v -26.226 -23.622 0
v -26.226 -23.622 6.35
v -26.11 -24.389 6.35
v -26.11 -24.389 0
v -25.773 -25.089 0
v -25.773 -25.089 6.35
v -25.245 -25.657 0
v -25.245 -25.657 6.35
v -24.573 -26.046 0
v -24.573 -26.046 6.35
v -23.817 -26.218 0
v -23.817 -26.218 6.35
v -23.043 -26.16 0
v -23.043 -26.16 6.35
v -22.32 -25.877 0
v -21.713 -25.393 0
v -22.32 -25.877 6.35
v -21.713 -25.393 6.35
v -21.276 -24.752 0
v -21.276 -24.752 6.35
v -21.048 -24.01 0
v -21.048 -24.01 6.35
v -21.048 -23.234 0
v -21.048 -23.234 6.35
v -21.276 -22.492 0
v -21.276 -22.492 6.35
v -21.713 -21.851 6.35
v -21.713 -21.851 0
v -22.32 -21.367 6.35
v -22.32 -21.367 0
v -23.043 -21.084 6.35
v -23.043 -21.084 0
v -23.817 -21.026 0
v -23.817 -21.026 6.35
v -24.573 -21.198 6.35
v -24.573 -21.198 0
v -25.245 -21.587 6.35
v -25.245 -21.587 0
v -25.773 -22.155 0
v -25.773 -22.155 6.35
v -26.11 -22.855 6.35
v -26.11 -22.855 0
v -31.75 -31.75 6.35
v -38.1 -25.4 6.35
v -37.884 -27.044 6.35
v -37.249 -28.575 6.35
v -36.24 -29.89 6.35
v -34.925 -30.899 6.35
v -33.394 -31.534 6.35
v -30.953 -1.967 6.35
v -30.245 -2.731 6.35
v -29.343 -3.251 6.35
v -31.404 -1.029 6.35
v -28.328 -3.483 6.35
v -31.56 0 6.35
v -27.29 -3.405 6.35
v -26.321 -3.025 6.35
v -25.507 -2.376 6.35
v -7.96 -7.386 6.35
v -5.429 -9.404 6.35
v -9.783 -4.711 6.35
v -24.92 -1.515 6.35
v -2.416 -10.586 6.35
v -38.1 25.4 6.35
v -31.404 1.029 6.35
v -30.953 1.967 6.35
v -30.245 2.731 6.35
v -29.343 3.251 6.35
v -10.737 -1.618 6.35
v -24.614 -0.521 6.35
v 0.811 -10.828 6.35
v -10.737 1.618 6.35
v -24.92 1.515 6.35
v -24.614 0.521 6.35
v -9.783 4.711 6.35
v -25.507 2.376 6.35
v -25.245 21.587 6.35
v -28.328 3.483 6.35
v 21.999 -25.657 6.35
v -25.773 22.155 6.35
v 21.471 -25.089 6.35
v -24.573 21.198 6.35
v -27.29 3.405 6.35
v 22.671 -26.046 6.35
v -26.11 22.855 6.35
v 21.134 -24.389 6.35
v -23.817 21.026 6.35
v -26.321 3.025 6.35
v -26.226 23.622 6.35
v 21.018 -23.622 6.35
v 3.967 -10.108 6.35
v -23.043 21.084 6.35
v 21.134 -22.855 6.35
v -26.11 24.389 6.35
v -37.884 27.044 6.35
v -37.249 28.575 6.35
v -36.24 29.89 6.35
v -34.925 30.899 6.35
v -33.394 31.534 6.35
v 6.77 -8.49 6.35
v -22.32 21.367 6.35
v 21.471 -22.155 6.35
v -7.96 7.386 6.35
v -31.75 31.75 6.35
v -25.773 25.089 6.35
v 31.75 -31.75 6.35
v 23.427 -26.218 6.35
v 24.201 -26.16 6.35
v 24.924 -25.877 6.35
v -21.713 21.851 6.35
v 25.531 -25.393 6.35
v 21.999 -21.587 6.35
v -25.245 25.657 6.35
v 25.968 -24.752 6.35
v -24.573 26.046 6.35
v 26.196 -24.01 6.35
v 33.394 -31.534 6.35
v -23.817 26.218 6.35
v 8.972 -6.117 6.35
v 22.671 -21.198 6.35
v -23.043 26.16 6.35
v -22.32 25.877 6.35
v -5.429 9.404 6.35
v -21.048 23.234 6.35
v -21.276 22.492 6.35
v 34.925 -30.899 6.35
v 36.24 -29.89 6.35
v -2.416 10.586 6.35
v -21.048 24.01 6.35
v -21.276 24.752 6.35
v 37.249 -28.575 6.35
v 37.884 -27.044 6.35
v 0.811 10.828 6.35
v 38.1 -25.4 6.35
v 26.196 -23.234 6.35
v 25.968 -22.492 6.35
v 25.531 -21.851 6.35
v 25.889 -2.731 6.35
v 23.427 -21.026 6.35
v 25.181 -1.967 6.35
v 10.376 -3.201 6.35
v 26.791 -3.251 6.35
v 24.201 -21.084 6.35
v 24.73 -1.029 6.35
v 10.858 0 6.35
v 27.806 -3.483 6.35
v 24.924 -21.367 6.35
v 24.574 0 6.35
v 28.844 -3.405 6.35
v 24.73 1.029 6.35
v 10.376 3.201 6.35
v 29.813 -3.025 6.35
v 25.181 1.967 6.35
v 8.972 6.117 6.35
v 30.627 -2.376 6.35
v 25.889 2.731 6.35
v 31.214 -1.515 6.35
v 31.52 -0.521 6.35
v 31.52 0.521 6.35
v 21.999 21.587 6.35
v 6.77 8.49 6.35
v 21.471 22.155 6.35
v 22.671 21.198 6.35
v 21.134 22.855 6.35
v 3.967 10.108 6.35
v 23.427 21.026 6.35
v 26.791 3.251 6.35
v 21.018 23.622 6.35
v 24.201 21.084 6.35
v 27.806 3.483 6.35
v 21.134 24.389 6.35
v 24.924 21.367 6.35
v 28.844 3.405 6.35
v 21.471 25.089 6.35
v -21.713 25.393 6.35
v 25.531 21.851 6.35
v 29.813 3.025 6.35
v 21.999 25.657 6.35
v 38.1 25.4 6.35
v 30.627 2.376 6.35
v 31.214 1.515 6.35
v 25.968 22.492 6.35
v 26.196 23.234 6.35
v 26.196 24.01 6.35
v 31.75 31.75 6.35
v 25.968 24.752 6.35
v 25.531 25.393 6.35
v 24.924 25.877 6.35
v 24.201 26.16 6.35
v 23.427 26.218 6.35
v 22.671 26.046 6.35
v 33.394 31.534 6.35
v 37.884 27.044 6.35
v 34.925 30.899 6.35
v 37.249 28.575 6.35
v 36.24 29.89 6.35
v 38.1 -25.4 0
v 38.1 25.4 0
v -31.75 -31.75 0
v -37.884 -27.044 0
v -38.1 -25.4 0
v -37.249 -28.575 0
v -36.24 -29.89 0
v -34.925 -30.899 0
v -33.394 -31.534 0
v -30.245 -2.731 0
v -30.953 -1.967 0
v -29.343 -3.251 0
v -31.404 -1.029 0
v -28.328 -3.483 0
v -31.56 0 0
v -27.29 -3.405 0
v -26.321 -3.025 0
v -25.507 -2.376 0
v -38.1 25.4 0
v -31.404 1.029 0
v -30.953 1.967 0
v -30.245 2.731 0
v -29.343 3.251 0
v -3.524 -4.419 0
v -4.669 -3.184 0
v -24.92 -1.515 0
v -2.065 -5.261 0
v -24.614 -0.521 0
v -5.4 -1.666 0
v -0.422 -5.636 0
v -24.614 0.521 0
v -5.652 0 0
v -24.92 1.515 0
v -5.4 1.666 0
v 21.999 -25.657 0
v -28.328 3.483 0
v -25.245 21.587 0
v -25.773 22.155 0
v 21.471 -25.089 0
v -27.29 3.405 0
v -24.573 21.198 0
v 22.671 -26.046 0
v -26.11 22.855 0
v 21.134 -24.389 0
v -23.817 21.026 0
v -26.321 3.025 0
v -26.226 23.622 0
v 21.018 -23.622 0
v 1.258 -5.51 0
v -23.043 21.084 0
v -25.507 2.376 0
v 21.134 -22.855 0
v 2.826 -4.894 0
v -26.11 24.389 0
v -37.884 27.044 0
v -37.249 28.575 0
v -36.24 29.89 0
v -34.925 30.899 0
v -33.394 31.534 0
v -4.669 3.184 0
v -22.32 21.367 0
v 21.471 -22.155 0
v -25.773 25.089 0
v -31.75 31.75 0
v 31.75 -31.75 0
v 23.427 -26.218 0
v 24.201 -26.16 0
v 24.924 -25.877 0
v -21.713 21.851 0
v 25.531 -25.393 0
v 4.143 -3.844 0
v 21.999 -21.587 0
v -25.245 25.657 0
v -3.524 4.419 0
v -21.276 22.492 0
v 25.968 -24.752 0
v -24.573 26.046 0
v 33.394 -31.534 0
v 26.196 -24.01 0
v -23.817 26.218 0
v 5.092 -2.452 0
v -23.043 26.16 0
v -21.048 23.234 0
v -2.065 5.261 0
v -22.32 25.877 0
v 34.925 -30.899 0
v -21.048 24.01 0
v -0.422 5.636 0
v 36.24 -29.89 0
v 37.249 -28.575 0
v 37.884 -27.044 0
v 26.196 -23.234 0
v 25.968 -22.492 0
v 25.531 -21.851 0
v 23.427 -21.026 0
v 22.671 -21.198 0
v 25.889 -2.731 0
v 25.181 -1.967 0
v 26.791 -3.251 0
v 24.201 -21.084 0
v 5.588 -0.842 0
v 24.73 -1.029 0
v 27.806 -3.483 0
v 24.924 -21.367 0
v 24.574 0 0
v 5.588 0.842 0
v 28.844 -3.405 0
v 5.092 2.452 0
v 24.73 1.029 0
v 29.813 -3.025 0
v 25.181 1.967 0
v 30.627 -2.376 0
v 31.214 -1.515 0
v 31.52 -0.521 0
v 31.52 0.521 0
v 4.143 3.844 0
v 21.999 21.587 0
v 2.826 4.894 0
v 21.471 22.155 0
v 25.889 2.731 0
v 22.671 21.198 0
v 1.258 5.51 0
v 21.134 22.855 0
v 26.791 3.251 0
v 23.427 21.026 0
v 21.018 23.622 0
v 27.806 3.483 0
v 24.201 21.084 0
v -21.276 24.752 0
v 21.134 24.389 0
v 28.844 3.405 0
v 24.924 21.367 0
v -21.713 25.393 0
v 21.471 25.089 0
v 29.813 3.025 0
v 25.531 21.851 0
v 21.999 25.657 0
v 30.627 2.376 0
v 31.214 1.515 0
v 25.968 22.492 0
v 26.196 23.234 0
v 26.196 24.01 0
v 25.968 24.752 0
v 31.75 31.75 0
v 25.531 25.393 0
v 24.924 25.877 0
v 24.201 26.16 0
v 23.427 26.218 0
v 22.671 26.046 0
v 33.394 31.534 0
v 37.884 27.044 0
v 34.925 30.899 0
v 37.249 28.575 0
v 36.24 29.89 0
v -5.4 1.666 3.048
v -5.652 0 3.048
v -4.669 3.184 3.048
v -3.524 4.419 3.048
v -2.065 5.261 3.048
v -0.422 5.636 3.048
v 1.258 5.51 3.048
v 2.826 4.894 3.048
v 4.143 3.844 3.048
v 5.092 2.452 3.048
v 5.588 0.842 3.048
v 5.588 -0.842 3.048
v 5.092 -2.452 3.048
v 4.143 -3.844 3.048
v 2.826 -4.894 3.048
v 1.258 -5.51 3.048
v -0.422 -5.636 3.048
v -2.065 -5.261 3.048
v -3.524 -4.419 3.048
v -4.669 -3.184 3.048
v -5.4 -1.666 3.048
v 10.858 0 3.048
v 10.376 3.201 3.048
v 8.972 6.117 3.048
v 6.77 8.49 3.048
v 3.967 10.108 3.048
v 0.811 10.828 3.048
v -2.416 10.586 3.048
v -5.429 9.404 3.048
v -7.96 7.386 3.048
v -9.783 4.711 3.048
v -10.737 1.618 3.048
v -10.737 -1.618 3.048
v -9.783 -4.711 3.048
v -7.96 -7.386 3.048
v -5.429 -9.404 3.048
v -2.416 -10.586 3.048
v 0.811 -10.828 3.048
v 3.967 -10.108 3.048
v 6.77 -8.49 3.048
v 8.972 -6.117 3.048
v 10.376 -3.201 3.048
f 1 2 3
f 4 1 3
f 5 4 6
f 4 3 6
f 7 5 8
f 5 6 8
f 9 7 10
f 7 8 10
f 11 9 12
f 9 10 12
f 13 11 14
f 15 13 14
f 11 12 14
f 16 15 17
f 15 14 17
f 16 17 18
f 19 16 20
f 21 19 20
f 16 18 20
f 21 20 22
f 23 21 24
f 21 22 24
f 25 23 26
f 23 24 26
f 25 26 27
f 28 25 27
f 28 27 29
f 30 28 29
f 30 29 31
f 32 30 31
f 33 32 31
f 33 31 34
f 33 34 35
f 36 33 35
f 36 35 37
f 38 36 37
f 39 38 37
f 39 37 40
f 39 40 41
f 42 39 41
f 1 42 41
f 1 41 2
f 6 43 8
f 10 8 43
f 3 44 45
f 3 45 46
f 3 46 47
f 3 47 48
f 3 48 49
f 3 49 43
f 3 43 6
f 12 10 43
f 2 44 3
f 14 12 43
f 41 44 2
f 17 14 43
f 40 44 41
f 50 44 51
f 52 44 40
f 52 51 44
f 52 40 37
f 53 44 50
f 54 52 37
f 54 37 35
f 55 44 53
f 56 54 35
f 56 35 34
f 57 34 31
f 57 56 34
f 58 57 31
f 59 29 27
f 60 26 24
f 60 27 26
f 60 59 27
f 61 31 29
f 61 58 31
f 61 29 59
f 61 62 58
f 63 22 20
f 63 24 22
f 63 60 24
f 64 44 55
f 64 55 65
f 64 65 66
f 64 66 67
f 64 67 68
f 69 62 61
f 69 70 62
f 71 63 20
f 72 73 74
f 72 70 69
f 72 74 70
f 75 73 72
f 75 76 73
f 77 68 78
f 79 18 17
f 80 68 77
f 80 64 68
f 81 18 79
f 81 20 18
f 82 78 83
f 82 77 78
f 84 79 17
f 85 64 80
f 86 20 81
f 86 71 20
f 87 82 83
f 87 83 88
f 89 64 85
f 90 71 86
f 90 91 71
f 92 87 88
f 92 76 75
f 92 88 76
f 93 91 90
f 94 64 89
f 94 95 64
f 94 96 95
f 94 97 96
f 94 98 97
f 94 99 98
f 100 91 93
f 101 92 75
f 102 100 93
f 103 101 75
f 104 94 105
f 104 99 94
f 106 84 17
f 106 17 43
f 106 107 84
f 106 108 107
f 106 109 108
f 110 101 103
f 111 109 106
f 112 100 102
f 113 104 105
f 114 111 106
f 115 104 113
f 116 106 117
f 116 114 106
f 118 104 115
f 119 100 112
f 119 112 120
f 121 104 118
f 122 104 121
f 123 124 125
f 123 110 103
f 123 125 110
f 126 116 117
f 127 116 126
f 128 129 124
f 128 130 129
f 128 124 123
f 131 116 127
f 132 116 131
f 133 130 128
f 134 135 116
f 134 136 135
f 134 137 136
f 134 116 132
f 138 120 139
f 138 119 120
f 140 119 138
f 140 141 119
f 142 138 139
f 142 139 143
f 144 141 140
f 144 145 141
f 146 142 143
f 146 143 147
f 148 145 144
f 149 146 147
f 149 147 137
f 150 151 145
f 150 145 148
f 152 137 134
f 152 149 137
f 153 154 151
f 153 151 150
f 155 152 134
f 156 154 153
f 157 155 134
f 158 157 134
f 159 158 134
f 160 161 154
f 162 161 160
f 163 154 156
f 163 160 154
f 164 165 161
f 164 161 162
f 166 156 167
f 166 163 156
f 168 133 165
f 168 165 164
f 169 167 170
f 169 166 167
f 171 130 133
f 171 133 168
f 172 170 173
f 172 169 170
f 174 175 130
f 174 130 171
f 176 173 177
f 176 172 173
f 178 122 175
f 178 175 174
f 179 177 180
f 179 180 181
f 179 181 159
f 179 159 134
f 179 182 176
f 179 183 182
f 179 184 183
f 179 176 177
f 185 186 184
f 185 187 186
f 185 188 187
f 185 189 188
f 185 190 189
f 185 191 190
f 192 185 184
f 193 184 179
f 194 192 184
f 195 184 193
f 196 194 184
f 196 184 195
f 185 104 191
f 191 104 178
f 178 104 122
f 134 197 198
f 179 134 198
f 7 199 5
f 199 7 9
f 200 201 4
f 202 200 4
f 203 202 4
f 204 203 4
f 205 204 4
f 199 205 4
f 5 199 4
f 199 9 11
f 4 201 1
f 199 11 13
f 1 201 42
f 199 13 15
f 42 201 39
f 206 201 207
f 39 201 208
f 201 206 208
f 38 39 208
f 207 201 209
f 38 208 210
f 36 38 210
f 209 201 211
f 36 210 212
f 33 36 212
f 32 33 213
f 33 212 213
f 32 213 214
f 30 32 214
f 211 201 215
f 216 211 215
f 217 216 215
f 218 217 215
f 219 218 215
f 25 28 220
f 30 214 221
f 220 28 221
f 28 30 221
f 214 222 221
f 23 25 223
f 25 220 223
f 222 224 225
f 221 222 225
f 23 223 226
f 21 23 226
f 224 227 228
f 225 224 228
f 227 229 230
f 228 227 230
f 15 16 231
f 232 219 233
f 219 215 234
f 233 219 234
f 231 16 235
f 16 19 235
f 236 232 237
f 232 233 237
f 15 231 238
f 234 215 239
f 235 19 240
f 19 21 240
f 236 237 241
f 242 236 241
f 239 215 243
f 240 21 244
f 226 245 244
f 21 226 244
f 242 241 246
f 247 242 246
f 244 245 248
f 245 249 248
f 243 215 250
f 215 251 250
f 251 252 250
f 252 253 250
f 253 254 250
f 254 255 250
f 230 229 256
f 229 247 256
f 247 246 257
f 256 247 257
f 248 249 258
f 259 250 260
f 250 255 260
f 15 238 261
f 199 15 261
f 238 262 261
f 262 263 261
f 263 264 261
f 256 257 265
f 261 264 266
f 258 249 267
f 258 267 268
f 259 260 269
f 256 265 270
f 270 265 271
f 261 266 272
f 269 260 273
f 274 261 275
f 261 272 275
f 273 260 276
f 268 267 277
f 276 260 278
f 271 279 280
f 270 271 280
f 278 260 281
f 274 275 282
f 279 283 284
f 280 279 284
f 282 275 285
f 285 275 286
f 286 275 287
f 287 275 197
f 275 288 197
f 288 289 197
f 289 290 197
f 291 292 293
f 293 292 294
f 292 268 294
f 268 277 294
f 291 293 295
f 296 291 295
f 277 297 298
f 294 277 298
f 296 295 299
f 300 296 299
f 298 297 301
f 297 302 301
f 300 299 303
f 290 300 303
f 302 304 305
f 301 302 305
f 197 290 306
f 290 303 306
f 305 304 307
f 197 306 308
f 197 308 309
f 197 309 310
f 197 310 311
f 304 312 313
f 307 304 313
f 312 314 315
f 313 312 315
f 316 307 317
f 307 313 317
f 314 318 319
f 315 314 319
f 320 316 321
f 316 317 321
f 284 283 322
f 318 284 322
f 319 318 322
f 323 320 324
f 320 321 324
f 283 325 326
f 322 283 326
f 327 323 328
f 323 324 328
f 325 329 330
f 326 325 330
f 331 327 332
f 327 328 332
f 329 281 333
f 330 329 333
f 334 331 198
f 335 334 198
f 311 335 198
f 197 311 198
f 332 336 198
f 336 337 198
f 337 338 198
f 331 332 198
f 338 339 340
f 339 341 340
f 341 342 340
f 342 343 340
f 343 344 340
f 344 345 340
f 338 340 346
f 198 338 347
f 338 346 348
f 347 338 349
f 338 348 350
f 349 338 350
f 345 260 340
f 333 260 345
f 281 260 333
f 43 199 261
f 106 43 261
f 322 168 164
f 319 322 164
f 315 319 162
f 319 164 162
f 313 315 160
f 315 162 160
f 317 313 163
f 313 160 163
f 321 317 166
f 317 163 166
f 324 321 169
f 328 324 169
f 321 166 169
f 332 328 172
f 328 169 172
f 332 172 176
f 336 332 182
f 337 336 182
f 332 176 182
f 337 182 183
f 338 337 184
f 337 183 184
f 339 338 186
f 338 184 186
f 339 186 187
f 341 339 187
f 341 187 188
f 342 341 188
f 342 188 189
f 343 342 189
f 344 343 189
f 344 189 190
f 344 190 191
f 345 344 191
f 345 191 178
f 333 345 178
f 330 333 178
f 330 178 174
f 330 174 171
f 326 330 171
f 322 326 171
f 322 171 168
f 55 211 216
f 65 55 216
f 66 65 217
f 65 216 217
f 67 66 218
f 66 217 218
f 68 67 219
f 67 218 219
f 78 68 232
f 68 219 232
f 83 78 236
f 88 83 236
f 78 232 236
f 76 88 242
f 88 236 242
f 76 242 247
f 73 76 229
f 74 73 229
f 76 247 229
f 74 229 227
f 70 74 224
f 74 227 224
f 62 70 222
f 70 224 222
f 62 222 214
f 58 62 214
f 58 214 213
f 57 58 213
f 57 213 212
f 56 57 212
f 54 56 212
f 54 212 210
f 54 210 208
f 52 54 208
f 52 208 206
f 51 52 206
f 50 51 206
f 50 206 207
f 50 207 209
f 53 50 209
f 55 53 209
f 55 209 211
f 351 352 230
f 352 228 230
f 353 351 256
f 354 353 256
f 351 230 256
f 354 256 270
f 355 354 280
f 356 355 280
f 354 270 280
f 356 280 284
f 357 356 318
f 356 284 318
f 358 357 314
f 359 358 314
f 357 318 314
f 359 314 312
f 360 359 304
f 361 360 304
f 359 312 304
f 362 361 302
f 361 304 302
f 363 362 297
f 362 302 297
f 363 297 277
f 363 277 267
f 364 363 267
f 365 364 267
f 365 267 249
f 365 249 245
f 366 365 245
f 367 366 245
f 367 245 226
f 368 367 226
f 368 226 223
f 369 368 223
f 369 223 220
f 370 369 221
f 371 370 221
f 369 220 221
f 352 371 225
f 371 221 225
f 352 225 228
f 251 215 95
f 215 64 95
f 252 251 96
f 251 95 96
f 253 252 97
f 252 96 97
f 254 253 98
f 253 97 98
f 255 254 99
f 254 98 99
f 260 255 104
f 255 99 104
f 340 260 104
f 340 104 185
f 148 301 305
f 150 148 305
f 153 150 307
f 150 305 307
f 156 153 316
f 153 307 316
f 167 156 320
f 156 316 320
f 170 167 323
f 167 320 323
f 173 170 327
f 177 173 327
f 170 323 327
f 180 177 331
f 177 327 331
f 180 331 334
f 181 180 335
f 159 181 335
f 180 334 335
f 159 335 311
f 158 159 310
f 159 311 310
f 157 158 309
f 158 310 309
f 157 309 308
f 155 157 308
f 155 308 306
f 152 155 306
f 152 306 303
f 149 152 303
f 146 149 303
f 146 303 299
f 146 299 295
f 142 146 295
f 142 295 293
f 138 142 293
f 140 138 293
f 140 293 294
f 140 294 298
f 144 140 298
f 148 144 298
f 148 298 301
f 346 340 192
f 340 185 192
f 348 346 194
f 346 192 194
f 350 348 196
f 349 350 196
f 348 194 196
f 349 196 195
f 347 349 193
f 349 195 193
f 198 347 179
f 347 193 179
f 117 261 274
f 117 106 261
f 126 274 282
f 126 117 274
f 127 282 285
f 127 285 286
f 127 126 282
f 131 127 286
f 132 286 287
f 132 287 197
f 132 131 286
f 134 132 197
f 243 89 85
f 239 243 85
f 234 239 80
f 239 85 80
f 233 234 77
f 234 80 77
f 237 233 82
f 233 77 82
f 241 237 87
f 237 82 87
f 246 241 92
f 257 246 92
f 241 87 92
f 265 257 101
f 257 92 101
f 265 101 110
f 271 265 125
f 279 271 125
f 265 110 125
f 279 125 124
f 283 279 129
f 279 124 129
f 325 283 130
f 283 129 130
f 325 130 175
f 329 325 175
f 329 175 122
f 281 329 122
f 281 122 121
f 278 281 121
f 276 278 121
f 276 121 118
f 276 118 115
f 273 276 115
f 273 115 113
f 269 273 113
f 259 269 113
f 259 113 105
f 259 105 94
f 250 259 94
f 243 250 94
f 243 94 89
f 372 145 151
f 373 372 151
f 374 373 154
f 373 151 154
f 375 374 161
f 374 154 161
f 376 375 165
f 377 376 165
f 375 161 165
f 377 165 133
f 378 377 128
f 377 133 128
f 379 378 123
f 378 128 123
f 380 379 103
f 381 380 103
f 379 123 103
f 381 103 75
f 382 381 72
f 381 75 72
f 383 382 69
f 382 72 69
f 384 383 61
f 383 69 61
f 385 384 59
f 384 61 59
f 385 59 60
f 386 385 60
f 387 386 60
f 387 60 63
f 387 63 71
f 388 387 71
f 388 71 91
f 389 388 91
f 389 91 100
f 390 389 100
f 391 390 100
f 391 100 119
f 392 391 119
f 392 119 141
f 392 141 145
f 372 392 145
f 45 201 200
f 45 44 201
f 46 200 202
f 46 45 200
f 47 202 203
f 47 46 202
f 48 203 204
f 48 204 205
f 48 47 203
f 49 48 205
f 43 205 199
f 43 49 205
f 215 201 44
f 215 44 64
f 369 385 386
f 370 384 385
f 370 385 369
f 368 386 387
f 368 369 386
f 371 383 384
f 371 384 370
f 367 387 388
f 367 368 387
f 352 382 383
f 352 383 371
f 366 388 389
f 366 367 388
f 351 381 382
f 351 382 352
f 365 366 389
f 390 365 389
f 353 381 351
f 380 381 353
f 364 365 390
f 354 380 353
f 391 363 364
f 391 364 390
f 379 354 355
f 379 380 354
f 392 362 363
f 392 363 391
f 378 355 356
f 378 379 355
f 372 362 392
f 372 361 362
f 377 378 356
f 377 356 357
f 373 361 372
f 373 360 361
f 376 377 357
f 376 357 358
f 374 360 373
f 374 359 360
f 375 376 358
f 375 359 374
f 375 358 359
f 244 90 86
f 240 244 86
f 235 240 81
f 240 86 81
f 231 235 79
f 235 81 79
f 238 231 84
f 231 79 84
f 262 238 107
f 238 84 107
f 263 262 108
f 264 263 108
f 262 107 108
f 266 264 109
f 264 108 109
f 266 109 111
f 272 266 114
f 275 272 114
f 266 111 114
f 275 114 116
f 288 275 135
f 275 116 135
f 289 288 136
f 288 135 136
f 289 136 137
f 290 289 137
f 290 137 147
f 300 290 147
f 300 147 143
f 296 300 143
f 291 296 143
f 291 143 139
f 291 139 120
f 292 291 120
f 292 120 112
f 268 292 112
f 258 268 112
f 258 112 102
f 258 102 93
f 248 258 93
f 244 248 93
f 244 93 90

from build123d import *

# Parameters (mm, degrees)
F1_W           = 76.2
F1_H           = 63.5
F2_DEPTH       = 6.35
F4_D           = 11.303
F4_CBORE_D     = 21.717
F4_CBORE_DEPTH = 3.302
F6_D           = 6.985
F7_D           = 6.985
F8_D           = 5.207
F9_D           = 5.207
F10_D          = 5.207
F11_R          = 6.35


with BuildPart() as f2:
    # F1 (on Top) → F2 (new body)
    with BuildSketch(Plane.XY):
        Rectangle(F1_W, F1_H)
    extrude(amount=F2_DEPTH)

    # F4 (through all)
    with Locations(Plane.XY.offset(6.35)):
        with Locations((0, 0)):
            CounterBoreHole(F4_D / 2, F4_CBORE_D / 2, F4_CBORE_DEPTH)

    # F6 (through all)
    with Locations(Plane.XY.offset(6.35)):
        with Locations((-28.067, 0)):
            Hole(F6_D / 2)

    # F7 (through all)
    with Locations(Plane.XY.offset(6.35)):
        with Locations((28.067, 0)):
            Hole(F7_D / 2)

    # F8 (through all)
    with Locations(Plane(origin=(0, 0, 0), x_dir=(1, 0, 0), z_dir=(0, 0, -1))):
        with Locations((-23.622, 23.622)):
            Hole(F8_D / 2)

    # F9 (through all)
    with Locations(Plane(origin=(0, 0, 0), x_dir=(1, 0, 0), z_dir=(0, 0, -1))):
        with Locations((23.622, 23.622), (-23.622, -23.622)):
            Hole(F9_D / 2)

    # F10 (through all)
    with Locations(Plane(origin=(0, 0, 0), x_dir=(1, 0, 0), z_dir=(0, 0, -1))):
        with Locations((23.622, -23.622)):
            Hole(F10_D / 2)

    # F11
    f11_edges = [f2.edges().sort_by_distance(p)[0] for p in [
        (-38.1, -31.75, 3.175),
        (38.1, -31.75, 3.175),
        (38.1, 31.75, 3.175),
        (-38.1, 31.75, 3.175),
    ]]
    fillet(f11_edges, radius=F11_R)


solid = f2.part
